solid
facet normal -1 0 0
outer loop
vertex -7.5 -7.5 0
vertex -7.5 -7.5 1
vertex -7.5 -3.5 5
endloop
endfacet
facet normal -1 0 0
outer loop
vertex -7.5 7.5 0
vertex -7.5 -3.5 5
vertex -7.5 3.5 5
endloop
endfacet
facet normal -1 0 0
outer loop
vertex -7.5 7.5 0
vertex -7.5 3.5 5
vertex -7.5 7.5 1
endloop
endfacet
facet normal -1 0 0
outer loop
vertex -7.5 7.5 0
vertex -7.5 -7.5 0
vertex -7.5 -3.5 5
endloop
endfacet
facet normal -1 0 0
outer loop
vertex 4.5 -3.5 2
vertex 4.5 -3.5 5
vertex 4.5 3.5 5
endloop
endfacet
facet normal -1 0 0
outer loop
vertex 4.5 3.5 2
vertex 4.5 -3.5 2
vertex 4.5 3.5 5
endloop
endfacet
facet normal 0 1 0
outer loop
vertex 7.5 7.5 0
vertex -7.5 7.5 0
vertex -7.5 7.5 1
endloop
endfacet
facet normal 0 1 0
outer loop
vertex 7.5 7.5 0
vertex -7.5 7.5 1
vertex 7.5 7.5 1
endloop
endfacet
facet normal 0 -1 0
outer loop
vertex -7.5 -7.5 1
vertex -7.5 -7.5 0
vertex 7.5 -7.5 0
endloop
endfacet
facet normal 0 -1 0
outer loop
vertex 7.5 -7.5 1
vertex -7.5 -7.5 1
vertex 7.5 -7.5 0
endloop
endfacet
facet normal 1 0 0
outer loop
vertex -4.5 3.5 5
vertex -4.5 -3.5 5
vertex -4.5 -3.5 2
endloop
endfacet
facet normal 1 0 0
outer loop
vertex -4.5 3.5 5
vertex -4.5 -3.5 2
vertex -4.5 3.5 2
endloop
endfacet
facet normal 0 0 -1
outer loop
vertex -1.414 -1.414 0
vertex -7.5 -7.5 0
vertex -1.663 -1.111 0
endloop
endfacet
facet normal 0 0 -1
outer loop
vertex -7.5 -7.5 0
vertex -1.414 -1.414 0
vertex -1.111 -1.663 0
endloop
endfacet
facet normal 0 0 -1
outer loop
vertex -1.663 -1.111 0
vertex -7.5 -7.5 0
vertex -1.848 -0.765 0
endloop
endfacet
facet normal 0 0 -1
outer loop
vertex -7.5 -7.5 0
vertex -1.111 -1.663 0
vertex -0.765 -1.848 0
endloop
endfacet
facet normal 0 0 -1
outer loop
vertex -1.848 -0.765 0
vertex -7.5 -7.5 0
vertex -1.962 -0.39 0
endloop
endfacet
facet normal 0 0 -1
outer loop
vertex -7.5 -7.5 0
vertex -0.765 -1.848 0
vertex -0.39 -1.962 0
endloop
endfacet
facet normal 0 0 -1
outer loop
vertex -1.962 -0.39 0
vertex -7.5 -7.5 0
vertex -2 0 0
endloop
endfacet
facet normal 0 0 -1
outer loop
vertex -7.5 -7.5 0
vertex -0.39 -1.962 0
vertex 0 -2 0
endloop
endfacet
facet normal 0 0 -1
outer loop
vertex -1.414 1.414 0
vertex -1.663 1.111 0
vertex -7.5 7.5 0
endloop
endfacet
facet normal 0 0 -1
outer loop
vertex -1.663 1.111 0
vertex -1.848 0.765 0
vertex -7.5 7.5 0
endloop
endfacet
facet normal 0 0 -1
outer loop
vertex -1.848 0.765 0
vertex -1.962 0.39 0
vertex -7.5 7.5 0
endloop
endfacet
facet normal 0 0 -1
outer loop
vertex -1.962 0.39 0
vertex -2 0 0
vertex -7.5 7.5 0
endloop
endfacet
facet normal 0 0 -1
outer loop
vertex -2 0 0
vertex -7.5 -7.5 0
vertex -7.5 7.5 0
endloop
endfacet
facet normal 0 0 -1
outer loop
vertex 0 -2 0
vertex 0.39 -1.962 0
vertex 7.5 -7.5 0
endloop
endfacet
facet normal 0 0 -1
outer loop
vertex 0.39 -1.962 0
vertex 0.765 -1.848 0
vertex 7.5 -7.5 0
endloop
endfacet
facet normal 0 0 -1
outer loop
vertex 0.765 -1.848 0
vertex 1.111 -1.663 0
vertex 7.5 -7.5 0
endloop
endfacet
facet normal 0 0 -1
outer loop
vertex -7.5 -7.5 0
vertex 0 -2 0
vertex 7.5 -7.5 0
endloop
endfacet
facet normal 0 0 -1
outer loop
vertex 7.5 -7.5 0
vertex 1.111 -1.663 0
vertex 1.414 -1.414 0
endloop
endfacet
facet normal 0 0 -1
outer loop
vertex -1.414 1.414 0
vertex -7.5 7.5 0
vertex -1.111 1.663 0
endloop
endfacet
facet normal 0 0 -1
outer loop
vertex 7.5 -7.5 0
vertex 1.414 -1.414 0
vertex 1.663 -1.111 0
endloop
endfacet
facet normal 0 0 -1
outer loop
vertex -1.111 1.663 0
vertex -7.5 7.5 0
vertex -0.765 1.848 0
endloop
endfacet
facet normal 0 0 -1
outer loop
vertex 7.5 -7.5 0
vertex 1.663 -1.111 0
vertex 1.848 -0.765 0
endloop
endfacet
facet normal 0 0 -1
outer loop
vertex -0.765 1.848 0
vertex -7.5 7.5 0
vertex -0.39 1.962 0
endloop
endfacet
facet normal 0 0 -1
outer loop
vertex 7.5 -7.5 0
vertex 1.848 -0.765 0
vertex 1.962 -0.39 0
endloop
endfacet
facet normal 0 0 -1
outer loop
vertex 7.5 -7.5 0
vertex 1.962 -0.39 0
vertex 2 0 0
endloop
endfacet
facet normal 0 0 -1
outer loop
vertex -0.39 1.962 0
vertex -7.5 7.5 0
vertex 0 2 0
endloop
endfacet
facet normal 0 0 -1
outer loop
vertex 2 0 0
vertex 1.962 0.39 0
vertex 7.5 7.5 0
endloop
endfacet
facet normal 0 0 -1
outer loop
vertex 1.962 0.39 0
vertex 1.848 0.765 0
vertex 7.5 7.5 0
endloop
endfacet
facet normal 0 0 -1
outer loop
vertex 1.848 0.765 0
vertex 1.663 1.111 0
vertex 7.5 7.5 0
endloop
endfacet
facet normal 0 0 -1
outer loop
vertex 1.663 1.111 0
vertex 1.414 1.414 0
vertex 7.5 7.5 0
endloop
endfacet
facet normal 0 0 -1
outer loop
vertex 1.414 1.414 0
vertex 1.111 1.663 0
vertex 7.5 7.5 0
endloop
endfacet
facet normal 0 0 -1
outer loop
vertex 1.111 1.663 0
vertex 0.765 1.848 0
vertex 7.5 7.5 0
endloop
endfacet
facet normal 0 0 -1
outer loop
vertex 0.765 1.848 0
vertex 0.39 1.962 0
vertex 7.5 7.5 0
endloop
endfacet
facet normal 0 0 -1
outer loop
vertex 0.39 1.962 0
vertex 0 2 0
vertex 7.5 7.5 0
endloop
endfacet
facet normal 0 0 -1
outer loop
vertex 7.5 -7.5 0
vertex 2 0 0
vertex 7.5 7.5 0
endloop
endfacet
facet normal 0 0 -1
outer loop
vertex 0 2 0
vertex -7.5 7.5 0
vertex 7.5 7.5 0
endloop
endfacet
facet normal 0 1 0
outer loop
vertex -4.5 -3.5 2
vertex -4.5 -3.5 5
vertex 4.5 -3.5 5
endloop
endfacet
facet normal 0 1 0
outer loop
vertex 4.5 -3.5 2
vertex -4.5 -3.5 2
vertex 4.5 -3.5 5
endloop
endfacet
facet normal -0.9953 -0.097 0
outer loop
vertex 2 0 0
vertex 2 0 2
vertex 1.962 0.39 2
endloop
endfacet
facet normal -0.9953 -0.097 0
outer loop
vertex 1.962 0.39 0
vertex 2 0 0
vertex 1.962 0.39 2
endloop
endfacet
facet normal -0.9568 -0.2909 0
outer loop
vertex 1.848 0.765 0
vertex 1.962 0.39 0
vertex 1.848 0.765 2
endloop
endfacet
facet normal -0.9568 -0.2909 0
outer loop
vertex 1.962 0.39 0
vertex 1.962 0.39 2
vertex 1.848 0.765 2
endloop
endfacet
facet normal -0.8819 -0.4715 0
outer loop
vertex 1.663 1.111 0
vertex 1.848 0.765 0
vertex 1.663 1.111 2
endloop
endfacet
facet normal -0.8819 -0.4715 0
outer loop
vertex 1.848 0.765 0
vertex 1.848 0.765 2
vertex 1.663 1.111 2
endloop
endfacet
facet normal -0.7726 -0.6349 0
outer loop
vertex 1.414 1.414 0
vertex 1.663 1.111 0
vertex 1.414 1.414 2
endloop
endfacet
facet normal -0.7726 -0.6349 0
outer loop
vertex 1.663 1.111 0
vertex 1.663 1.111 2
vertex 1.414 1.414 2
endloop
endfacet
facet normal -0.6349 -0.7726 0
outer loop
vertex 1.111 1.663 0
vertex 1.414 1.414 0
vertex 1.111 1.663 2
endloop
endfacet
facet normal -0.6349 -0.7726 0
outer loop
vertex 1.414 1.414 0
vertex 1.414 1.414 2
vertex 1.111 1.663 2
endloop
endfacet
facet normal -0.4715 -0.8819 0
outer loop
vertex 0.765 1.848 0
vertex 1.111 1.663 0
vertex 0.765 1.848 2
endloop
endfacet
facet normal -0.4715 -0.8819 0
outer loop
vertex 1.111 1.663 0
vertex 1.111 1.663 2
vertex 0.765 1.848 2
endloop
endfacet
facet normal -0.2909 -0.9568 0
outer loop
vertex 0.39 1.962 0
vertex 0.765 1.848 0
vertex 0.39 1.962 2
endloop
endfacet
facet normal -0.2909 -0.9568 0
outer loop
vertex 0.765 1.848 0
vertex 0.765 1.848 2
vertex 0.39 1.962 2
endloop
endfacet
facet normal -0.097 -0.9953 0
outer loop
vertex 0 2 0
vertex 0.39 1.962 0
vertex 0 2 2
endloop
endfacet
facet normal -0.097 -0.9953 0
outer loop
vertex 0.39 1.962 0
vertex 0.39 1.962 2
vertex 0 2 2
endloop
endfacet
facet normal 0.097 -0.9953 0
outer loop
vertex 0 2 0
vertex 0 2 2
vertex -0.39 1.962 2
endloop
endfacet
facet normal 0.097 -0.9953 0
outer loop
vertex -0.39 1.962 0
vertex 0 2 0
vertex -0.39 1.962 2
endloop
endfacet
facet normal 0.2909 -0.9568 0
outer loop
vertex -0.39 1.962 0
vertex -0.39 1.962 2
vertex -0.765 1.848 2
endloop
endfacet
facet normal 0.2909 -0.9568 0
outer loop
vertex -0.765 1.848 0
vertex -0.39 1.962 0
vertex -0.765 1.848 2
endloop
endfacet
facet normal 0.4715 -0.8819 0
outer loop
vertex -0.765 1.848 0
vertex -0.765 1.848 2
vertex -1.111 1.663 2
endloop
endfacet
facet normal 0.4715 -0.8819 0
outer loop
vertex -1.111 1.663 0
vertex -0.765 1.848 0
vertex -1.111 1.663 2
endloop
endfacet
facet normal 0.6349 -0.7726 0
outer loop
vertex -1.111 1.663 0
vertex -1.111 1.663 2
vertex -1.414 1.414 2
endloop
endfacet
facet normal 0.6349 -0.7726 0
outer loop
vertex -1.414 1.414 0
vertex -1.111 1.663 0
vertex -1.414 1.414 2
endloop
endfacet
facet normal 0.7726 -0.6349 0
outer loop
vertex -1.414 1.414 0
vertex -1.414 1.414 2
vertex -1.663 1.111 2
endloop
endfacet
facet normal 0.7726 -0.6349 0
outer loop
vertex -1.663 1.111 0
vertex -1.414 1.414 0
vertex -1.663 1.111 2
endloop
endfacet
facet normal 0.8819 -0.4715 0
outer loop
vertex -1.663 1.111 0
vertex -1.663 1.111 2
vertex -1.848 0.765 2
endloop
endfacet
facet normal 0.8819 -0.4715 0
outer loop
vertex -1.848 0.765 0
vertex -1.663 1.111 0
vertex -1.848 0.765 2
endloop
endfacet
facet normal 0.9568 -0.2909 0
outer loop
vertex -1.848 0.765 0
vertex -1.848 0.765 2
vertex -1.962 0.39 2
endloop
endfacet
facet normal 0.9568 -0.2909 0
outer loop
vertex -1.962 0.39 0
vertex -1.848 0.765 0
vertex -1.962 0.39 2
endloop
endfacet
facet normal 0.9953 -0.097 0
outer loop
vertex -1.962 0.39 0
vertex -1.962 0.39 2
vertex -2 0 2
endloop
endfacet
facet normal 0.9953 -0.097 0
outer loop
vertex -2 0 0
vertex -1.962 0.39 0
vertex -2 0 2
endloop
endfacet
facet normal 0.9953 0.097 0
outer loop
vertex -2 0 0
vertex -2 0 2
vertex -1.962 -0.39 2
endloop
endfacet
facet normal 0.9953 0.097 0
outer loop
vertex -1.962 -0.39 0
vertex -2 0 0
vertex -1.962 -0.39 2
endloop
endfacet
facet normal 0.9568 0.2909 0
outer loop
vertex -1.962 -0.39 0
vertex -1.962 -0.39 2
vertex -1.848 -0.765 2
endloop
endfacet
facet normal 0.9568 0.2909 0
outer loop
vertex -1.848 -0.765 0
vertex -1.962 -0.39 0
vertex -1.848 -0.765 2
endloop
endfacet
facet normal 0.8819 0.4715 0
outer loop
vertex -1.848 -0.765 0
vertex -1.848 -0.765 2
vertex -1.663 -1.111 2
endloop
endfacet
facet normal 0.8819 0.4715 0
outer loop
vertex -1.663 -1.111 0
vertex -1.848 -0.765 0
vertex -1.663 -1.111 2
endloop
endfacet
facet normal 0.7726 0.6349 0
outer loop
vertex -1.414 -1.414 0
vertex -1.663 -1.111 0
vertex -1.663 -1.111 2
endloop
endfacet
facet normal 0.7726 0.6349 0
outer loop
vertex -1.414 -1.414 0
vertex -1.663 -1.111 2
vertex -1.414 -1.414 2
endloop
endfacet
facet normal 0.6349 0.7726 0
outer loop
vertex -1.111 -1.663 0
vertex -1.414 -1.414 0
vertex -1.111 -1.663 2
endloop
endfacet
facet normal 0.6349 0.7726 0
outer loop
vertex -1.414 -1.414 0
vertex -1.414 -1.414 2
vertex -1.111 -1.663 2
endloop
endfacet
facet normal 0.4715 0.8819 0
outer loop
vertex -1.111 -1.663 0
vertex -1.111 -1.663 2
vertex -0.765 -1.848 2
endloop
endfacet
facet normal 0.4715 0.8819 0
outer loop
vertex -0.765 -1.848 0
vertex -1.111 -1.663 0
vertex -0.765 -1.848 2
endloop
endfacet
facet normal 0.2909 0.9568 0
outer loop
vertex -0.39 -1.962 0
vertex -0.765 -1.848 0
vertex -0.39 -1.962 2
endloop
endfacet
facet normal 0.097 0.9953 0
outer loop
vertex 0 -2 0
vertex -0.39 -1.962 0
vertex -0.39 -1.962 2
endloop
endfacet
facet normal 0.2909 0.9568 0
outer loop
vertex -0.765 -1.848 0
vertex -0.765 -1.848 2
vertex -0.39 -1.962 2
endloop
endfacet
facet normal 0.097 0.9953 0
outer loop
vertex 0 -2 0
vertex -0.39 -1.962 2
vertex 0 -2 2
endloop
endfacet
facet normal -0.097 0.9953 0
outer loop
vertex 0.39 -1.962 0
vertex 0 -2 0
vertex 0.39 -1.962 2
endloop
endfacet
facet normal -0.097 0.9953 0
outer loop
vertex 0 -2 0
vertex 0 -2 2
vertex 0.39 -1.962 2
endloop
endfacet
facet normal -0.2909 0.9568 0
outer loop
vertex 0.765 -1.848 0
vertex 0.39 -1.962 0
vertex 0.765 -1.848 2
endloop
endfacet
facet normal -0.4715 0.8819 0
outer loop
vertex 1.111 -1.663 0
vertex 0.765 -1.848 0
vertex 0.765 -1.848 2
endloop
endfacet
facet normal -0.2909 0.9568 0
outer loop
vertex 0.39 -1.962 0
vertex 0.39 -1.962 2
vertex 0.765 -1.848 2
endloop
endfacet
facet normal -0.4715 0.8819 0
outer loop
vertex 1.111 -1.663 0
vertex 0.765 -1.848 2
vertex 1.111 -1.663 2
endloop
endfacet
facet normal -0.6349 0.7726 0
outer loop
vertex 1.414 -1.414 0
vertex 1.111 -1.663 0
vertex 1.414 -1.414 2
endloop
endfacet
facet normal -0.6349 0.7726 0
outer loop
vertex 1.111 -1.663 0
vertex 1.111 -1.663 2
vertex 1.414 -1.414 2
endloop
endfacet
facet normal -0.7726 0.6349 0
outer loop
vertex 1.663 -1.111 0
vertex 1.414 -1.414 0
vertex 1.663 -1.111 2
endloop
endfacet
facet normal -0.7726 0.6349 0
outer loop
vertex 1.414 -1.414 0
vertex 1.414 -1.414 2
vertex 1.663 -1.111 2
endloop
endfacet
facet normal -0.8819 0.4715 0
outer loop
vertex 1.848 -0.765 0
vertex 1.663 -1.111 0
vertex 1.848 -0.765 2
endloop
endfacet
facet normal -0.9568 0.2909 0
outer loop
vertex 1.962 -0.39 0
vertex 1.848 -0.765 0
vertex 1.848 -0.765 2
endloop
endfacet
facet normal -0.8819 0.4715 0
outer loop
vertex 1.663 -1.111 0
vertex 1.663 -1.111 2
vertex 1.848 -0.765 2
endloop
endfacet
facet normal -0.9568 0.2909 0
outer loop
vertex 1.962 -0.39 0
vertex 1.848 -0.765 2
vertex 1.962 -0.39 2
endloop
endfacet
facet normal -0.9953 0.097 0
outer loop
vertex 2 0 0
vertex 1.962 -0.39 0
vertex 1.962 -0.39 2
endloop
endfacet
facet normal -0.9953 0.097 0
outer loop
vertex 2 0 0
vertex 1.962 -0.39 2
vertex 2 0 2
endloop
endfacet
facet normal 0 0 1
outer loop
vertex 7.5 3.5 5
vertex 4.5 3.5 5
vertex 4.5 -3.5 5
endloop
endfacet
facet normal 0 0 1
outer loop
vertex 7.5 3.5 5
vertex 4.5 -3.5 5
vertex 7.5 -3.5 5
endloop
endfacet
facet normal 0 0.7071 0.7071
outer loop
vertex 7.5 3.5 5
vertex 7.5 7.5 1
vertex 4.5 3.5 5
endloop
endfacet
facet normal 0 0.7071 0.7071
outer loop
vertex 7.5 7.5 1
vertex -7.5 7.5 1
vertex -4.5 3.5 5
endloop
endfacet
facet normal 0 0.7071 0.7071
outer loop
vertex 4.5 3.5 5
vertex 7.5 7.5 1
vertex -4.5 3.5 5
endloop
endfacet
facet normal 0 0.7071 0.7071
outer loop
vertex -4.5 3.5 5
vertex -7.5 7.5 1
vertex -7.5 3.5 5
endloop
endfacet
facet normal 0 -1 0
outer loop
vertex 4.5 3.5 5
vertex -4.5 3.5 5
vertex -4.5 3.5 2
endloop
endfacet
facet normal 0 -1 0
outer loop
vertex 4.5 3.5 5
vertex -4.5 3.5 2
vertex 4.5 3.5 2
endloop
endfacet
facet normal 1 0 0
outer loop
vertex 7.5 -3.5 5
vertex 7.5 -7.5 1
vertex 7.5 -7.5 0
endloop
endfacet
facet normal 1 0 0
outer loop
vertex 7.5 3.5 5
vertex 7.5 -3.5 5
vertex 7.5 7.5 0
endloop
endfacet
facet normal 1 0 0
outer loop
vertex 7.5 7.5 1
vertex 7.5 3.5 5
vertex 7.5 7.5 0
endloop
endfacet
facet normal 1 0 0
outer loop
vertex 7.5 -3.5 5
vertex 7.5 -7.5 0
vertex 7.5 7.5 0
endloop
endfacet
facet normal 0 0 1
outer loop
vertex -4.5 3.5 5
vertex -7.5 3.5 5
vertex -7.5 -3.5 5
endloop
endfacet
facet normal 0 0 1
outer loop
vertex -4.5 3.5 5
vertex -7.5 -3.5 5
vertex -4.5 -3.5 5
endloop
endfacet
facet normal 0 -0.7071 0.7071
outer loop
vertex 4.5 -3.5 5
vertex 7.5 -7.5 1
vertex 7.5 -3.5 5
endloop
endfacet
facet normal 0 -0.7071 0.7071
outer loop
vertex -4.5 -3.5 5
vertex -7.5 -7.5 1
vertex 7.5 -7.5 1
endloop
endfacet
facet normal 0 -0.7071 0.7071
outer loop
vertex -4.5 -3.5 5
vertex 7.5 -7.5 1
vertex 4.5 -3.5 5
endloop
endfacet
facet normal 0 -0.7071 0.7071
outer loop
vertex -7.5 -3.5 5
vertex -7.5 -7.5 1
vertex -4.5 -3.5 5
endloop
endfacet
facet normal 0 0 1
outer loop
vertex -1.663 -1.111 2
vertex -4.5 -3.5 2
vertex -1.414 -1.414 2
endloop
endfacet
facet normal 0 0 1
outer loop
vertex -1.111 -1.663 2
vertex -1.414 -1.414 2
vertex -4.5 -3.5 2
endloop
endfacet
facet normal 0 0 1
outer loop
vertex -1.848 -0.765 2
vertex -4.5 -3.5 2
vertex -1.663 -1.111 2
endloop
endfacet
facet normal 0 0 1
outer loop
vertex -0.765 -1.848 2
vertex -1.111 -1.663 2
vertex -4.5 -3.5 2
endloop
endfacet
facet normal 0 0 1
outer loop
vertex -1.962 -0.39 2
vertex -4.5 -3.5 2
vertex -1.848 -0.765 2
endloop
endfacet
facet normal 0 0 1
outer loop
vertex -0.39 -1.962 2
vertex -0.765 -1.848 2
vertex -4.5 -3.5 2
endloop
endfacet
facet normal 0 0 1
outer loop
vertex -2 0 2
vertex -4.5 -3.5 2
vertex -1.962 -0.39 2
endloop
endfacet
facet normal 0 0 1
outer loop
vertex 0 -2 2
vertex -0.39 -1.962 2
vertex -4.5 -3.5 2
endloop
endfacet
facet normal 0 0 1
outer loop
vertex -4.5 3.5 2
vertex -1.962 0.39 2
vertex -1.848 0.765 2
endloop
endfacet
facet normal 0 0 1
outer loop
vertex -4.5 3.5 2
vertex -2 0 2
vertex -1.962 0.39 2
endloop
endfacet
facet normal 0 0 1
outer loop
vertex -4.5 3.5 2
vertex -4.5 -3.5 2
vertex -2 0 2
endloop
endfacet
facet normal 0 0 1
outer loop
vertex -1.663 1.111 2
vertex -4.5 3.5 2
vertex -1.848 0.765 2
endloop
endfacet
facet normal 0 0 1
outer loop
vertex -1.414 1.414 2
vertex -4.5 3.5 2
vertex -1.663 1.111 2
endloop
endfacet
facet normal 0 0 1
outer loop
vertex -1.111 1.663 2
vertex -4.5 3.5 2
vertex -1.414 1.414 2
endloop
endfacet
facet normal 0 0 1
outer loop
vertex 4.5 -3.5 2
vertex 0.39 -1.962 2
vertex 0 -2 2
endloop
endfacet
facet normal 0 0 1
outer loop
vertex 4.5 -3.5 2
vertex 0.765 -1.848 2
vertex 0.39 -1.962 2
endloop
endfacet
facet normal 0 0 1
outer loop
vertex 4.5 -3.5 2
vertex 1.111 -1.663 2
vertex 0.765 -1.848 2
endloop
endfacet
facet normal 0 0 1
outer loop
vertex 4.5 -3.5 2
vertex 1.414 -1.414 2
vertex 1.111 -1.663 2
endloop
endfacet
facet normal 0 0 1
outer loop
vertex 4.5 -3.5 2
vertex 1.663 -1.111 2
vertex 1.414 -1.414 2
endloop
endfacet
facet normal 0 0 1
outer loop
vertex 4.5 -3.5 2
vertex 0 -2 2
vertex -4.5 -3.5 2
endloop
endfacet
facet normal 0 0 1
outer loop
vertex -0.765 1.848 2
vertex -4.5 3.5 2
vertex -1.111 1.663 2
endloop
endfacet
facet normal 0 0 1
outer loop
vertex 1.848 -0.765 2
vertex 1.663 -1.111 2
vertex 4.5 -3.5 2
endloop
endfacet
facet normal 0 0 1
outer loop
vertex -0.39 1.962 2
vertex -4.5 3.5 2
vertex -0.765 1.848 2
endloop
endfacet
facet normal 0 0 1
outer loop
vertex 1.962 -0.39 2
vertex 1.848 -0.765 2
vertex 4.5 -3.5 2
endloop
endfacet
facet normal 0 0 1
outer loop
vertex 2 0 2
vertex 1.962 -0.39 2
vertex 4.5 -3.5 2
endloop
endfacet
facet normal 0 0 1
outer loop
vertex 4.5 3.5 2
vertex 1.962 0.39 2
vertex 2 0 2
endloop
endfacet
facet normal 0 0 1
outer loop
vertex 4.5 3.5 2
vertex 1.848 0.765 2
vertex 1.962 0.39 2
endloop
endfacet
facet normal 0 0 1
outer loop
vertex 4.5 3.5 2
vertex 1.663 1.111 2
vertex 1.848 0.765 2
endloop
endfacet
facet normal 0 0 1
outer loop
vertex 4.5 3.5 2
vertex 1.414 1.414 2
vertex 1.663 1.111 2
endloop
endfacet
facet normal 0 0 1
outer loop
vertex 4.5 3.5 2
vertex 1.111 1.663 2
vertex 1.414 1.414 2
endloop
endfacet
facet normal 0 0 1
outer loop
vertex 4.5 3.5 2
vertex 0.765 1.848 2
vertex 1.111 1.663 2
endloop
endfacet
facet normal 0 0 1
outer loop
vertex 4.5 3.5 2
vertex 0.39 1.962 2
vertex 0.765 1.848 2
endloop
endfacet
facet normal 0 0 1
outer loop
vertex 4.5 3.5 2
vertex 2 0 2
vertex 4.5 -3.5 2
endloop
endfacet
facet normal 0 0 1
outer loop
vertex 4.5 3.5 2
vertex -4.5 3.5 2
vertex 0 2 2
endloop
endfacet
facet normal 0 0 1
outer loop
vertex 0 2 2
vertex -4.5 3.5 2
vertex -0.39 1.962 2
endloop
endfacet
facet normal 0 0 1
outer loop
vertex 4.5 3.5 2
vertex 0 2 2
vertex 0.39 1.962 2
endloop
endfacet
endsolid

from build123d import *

# Parameters (mm, degrees)
SKETCH1_W           = 15
SKETCH1_H           = 15
BOSS_EXTRUDE1_DEPTH = 5
CUT_EXTRUDE1_DEPTH  = 18.5
SKETCH3_R           = 2
CUT_EXTRUDE2_DEPTH  = 12.7260394
SKETCH4_W           = 9
SKETCH4_H           = 7
CUT_EXTRUDE4_DEPTH  = 3


with BuildPart() as part:
    # Sketch1 → Boss-Extrude1 (new body)
    with BuildSketch(Plane.XY):
        Rectangle(SKETCH1_W, SKETCH1_H)
    extrude(amount=BOSS_EXTRUDE1_DEPTH)

    # Sketch2 → Cut-Extrude1 (cut, through all)
    with BuildSketch(Plane.ZY.offset(7.5)):
        Polygon((1, 7.5), (5, 3.5), (5, 7.5), align=None)
        Polygon((1, -7.5), (5, -3.5), (5, -7.5), align=None)
    extrude(amount=-CUT_EXTRUDE1_DEPTH, mode=Mode.SUBTRACT)

    # Sketch3 → Cut-Extrude2 (cut, through all)
    with BuildSketch(Plane.XY.offset(5)):
        Circle(SKETCH3_R)
    extrude(amount=-CUT_EXTRUDE2_DEPTH, mode=Mode.SUBTRACT)

    # Sketch4 → Cut-Extrude4 (cut)
    with BuildSketch(Plane.XY.offset(5)):
        Rectangle(SKETCH4_W, SKETCH4_H)
    extrude(amount=-CUT_EXTRUDE4_DEPTH, mode=Mode.SUBTRACT)


solid = part.part
